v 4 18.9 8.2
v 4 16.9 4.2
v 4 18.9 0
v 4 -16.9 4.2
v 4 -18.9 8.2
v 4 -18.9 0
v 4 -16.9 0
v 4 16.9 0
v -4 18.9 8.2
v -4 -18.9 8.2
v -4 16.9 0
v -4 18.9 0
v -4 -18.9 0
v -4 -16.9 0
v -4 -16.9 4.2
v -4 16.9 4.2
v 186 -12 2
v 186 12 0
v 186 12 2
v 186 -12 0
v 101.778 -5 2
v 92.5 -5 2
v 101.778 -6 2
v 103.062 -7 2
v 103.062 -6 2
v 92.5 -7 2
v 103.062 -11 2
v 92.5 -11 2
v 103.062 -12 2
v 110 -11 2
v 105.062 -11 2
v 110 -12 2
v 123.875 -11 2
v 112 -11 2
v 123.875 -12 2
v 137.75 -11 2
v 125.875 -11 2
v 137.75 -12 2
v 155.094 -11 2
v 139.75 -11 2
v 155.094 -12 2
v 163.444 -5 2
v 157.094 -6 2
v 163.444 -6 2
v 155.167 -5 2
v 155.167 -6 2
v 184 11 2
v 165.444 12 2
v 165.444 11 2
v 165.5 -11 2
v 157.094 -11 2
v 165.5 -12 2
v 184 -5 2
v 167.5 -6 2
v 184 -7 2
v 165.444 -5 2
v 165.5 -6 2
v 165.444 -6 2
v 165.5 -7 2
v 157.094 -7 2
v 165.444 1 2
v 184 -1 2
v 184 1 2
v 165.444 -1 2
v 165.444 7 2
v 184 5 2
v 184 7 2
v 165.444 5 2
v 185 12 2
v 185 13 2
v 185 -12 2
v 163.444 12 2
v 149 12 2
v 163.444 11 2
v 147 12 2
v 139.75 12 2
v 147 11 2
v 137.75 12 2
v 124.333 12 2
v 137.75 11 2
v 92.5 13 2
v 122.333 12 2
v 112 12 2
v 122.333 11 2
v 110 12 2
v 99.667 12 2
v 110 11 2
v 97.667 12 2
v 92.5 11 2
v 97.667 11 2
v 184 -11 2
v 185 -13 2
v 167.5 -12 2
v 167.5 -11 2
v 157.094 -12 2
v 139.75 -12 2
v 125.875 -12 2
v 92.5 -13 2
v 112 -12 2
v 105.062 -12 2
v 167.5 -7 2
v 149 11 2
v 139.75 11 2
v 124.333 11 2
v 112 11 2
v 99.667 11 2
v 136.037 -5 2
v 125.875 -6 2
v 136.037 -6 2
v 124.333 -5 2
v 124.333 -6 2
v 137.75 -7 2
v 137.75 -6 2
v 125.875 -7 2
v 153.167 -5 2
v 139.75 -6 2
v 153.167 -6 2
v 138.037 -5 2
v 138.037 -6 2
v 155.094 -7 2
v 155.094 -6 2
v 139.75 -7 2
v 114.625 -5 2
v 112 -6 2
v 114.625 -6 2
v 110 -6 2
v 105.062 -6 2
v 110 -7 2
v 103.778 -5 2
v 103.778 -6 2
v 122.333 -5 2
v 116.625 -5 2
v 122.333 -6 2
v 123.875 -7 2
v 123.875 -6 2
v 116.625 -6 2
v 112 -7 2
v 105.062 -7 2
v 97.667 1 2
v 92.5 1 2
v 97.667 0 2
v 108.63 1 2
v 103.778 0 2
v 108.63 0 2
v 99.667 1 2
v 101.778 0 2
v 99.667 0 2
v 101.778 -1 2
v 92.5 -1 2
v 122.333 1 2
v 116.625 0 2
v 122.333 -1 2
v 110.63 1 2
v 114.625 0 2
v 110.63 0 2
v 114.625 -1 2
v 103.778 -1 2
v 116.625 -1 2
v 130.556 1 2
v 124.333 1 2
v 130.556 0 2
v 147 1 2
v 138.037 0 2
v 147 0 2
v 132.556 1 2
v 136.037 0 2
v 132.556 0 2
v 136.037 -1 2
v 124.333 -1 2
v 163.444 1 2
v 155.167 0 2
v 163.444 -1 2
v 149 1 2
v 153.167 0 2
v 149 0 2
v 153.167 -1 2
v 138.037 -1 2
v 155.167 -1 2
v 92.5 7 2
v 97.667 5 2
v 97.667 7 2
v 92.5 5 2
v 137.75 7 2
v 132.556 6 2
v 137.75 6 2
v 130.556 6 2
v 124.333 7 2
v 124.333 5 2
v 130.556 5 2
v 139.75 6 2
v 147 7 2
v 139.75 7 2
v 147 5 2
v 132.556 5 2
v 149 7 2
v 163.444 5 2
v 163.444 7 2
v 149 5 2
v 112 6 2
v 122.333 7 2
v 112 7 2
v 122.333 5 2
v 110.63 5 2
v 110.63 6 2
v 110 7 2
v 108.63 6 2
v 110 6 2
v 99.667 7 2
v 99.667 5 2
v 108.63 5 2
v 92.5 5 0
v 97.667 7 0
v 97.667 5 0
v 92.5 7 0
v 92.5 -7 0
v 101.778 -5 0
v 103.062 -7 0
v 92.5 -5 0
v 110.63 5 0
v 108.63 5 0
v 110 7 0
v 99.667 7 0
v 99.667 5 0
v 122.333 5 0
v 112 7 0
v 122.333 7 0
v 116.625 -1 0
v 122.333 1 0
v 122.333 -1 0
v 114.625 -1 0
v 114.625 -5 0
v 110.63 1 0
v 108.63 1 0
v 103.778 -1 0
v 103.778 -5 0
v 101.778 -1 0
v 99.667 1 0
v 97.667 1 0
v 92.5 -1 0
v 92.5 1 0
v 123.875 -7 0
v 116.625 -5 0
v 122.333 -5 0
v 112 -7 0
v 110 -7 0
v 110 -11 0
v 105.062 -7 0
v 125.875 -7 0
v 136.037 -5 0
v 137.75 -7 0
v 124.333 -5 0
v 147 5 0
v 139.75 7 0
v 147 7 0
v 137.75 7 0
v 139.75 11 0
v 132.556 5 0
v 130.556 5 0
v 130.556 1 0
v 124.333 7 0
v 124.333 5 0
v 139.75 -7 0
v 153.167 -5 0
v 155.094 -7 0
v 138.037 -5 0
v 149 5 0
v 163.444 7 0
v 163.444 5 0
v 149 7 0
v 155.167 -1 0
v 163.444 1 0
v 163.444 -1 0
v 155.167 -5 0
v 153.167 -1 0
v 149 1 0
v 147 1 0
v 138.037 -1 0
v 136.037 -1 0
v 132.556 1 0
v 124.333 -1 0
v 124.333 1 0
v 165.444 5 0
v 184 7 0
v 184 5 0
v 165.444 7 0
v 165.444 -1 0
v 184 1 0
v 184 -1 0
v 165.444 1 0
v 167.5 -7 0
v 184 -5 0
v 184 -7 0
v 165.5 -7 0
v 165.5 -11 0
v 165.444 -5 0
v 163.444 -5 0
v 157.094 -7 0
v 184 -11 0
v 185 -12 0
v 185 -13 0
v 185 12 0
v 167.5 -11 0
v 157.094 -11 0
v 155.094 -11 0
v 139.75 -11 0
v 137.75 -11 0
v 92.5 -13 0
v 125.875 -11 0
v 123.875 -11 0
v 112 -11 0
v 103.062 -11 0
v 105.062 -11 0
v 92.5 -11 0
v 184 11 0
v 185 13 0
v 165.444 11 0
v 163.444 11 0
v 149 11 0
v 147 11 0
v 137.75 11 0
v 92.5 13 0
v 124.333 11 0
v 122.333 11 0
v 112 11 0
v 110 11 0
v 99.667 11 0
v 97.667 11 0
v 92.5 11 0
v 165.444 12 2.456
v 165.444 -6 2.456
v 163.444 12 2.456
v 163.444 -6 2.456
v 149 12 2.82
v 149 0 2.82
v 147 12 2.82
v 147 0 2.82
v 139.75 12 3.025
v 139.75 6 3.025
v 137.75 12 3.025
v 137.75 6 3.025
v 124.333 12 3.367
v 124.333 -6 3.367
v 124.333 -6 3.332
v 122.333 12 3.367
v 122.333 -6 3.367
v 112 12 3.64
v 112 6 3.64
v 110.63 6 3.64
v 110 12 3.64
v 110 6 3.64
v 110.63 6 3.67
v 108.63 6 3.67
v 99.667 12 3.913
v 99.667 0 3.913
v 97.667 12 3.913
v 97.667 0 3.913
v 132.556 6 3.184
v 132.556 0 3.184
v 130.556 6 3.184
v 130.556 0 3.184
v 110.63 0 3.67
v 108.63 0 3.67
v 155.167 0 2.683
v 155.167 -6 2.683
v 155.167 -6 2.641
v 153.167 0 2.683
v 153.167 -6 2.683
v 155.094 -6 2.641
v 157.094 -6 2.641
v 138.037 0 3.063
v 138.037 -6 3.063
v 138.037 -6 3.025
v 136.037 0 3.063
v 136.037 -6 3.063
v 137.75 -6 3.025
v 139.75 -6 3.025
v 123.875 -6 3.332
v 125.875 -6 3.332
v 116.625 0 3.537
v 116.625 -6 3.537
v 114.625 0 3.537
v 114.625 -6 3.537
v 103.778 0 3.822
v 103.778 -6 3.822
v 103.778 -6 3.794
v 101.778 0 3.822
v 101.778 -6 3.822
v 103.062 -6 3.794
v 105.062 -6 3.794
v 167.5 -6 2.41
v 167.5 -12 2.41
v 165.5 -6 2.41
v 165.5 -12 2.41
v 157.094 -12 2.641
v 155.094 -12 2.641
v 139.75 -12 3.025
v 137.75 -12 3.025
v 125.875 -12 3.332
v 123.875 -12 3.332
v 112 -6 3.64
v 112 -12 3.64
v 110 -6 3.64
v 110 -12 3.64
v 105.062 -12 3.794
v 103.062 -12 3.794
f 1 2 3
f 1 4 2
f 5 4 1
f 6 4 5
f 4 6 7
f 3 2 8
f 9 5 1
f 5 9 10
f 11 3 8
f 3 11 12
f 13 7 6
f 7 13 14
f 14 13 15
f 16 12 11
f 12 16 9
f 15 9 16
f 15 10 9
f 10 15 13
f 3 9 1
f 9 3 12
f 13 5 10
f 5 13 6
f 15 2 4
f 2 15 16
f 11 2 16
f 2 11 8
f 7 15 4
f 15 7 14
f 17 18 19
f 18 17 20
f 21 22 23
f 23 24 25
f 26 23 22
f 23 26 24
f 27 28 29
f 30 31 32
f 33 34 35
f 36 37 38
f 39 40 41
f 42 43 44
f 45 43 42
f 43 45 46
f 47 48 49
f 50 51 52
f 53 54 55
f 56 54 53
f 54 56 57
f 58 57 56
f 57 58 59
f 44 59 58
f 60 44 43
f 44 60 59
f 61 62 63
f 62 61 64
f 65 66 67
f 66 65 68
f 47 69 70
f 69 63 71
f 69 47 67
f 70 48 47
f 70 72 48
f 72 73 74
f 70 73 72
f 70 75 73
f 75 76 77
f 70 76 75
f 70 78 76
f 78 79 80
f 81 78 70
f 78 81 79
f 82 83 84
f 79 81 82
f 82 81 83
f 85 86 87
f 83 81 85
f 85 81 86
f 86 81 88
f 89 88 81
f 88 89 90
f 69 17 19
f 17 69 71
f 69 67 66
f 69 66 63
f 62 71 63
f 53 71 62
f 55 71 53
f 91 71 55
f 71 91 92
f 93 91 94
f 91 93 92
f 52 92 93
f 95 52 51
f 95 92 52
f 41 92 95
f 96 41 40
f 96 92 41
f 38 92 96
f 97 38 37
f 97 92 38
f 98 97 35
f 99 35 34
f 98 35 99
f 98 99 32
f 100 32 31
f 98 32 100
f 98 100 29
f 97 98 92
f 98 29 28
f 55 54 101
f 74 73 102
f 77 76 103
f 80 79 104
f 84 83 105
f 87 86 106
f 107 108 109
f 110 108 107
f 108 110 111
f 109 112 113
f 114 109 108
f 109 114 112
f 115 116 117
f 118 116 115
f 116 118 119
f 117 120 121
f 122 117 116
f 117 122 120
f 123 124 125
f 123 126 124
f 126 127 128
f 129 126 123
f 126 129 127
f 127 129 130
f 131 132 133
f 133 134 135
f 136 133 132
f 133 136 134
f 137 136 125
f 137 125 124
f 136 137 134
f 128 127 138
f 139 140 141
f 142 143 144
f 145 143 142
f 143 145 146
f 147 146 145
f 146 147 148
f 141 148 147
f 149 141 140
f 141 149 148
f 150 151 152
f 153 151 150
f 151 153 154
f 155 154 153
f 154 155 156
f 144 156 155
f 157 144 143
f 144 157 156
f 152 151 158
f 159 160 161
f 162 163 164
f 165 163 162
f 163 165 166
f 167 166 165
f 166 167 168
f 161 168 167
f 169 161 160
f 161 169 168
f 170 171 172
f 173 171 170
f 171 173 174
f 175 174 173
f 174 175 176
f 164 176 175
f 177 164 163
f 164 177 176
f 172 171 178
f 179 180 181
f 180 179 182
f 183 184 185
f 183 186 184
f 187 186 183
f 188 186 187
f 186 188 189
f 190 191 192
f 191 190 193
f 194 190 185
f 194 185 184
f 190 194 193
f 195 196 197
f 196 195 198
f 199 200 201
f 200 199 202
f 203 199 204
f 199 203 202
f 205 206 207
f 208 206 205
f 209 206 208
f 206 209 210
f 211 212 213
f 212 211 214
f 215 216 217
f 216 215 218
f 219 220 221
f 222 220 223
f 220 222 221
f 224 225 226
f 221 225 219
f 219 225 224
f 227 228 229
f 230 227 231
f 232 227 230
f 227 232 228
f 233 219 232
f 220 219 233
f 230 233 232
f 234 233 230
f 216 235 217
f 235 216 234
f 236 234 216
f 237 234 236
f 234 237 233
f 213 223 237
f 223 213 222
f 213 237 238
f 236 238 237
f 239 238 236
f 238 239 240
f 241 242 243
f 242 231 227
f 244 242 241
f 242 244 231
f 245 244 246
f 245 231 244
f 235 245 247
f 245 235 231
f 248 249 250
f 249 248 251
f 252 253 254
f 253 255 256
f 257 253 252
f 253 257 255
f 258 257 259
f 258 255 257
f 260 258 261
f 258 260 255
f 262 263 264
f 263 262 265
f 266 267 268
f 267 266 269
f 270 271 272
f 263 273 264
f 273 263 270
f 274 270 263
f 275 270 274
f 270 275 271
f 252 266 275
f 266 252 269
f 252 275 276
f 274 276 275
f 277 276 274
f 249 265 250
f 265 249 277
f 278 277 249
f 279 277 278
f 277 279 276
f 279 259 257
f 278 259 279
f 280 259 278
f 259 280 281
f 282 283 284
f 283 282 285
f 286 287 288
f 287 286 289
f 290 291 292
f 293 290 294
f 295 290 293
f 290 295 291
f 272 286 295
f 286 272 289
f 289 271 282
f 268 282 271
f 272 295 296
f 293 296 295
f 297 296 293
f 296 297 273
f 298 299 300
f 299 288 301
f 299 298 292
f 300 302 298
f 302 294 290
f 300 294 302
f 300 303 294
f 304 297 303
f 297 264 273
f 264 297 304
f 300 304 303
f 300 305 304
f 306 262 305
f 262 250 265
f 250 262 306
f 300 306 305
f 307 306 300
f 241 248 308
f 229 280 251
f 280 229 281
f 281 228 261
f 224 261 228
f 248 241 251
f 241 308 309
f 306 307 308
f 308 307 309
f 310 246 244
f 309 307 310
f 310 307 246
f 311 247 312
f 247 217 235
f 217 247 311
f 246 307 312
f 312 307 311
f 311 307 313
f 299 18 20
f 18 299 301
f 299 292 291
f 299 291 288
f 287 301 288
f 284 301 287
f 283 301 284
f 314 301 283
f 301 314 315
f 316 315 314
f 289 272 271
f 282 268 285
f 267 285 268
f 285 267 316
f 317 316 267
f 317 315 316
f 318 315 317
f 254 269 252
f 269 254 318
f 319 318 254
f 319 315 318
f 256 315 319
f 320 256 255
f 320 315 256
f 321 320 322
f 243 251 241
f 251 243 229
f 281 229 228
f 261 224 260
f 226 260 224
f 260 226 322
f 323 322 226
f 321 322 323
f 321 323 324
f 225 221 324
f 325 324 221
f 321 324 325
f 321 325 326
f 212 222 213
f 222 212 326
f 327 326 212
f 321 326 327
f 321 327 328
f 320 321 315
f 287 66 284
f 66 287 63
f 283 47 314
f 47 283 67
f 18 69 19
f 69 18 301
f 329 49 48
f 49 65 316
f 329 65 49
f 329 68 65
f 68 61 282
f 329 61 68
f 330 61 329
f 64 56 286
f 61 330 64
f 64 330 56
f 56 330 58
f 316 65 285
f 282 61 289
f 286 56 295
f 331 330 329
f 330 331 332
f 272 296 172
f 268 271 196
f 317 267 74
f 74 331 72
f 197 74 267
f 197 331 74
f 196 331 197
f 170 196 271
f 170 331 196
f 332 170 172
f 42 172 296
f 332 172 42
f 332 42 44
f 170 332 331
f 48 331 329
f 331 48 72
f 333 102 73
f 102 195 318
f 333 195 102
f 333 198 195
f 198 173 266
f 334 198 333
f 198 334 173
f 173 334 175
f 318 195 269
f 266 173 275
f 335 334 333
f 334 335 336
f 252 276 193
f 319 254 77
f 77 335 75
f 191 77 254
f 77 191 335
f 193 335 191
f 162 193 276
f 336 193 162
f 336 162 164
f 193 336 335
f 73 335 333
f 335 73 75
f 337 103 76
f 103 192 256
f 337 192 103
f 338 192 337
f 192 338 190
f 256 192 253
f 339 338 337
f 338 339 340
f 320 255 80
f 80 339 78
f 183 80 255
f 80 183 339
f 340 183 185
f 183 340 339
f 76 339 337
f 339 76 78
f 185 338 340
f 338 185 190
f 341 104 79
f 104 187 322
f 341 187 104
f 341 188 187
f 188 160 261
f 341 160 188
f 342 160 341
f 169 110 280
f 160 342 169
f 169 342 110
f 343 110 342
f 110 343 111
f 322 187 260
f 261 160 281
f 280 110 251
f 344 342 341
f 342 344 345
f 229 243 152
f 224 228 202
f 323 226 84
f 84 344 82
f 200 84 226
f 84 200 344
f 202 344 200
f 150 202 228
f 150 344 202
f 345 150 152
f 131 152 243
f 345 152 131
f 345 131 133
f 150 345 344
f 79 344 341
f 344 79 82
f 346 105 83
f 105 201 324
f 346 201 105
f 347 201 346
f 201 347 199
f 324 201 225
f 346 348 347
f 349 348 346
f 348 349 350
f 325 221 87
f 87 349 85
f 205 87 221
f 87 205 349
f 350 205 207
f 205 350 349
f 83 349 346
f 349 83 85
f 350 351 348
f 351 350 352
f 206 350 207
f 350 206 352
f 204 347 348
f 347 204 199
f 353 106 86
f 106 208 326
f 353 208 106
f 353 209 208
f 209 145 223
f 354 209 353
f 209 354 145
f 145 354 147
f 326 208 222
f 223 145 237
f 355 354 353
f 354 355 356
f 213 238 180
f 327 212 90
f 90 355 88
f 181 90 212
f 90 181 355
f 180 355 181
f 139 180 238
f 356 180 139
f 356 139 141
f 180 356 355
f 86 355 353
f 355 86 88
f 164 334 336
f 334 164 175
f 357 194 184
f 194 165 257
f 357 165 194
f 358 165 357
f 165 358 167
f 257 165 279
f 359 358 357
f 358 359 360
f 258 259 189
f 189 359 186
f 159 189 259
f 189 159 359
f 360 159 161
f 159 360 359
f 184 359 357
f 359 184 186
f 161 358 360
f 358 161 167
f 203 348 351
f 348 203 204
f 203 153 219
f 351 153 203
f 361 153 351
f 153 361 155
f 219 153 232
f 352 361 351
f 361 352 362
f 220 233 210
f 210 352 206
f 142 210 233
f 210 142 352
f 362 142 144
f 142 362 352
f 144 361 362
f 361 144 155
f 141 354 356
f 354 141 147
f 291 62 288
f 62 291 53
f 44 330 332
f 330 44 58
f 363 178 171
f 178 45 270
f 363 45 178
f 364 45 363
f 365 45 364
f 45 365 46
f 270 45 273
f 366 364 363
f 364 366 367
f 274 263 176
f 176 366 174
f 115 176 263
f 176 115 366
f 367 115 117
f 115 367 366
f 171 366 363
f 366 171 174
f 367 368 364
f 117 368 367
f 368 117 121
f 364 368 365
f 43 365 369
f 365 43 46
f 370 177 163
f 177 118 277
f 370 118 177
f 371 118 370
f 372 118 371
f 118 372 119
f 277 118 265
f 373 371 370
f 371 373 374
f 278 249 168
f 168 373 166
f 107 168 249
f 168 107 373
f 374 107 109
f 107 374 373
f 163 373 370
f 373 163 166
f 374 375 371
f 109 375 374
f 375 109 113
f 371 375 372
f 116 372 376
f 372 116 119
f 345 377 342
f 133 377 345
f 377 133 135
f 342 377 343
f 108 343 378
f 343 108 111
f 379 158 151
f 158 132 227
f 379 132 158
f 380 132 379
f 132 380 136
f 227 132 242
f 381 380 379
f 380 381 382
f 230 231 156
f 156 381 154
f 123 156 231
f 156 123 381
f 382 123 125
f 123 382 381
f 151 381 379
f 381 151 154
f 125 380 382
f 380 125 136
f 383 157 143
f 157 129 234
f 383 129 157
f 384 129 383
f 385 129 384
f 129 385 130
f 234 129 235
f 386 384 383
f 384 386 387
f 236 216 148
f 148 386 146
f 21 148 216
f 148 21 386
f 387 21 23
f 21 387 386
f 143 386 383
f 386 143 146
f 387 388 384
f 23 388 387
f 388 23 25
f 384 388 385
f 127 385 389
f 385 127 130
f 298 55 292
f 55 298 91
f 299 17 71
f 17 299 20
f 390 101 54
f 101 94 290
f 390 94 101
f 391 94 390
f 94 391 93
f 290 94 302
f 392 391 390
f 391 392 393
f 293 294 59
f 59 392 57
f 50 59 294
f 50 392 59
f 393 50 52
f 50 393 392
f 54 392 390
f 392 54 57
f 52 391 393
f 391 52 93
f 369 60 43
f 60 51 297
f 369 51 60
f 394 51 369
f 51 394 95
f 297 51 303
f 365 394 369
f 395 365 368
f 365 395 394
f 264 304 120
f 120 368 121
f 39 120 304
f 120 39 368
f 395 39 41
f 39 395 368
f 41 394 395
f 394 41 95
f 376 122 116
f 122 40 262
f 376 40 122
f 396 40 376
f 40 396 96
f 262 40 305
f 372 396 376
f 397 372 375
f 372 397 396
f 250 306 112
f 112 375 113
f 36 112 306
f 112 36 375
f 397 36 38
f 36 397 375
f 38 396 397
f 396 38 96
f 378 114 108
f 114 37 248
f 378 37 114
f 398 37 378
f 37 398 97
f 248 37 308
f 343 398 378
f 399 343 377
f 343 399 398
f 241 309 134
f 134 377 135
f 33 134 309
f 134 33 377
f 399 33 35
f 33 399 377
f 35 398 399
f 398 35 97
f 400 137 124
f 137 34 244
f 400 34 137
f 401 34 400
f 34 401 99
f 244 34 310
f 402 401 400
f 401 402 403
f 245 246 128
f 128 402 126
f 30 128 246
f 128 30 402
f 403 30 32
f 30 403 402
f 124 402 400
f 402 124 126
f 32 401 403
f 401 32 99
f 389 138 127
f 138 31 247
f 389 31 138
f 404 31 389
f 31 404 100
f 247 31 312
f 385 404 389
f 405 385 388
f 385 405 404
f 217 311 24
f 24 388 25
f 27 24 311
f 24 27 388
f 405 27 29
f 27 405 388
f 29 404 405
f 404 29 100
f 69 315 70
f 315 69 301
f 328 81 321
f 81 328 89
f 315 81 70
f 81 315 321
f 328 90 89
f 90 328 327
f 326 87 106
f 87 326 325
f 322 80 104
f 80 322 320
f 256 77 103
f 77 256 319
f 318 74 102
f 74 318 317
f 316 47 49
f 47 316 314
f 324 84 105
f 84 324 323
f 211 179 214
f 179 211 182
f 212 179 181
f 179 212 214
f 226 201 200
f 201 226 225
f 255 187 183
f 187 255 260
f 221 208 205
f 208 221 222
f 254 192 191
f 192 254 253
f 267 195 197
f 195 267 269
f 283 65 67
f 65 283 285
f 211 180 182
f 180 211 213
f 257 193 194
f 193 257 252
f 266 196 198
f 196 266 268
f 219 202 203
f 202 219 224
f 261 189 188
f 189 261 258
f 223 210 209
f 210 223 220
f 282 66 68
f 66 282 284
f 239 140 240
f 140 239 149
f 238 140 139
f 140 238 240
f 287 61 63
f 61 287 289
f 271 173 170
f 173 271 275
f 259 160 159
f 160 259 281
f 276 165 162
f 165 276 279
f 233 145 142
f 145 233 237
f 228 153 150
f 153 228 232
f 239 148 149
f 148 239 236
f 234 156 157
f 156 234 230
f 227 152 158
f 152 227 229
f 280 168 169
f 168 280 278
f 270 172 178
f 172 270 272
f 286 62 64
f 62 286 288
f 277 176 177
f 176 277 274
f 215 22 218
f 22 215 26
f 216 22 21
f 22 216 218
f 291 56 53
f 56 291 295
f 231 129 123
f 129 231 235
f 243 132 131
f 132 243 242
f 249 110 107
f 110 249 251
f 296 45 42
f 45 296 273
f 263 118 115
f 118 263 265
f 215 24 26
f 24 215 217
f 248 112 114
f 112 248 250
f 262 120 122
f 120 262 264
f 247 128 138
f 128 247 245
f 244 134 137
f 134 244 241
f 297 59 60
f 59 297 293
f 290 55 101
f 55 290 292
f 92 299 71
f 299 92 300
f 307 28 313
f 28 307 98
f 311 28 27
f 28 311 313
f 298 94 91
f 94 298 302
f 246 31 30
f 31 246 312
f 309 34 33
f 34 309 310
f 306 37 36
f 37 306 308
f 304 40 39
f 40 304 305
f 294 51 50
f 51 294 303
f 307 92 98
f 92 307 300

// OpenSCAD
// Generated by SolidPython 1.1.3 on 2022-07-08 14:14:54


union() {
	difference() {
		translate(v = [0, 0, 4.1000000000]) {
			cube(center = true, size = [8, 37.8000000000, 8.2000000000]);
		}
		translate(v = [0, 0, 2.1000000000]) {
			cube(center = true, size = [12, 33.8000000000, 4.2000000000]);
		}
	}
	translate(v = [185.0, 9.0000000000, 1.0]) {
		cube(center = true, size = [2, 6.0000000000, 2.0]);
	}
	translate(v = [164.44444444444443, 9.0000000000, 1.2277777777777779]) {
		cube(center = true, size = [2, 6.0000000000, 2.4555555555555557]);
	}
	translate(v = [148.0, 9.0000000000, 1.41]) {
		cube(center = true, size = [2, 6.0000000000, 2.82]);
	}
	translate(v = [138.75, 9.0000000000, 1.5125]) {
		cube(center = true, size = [2, 6.0000000000, 3.025]);
	}
	translate(v = [123.33333333333333, 9.0000000000, 1.6833333333333333]) {
		cube(center = true, size = [2, 6.0000000000, 3.3666666666666667]);
	}
	translate(v = [111.0, 9.0000000000, 1.8199999999999998]) {
		cube(center = true, size = [2, 6.0000000000, 3.6399999999999997]);
	}
	translate(v = [98.66666666666667, 9.0000000000, 1.9566666666666666]) {
		cube(center = true, size = [2, 6.0000000000, 3.913333333333333]);
	}
	translate(v = [185.0, 3.0000000000, 1.0]) {
		cube(center = true, size = [2, 6.0000000000, 2.0]);
	}
	translate(v = [164.44444444444443, 3.0000000000, 1.2277777777777779]) {
		cube(center = true, size = [2, 6.0000000000, 2.4555555555555557]);
	}
	translate(v = [148.0, 3.0000000000, 1.41]) {
		cube(center = true, size = [2, 6.0000000000, 2.82]);
	}
	translate(v = [131.55555555555554, 3.0000000000, 1.5922222222222224]) {
		cube(center = true, size = [2, 6.0000000000, 3.184444444444445]);
	}
	translate(v = [123.33333333333333, 3.0000000000, 1.6833333333333333]) {
		cube(center = true, size = [2, 6.0000000000, 3.3666666666666667]);
	}
	translate(v = [109.62962962962962, 3.0000000000, 1.835185185185185]) {
		cube(center = true, size = [2, 6.0000000000, 3.67037037037037]);
	}
	translate(v = [98.66666666666667, 3.0000000000, 1.9566666666666666]) {
		cube(center = true, size = [2, 6.0000000000, 3.913333333333333]);
	}
	translate(v = [185.0, -3.0000000000, 1.0]) {
		cube(center = true, size = [2, 6.0000000000, 2.0]);
	}
	translate(v = [164.44444444444446, -3.0000000000, 1.2277777777777776]) {
		cube(center = true, size = [2, 6.0000000000, 2.4555555555555553]);
	}
	translate(v = [154.16666666666669, -3.0000000000, 1.3416666666666663]) {
		cube(center = true, size = [2, 6.0000000000, 2.6833333333333327]);
	}
	translate(v = [137.03703703703704, -3.0000000000, 1.5314814814814814]) {
		cube(center = true, size = [2, 6.0000000000, 3.062962962962963]);
	}
	translate(v = [123.33333333333334, -3.0000000000, 1.6833333333333331]) {
		cube(center = true, size = [2, 6.0000000000, 3.3666666666666663]);
	}
	translate(v = [115.625, -3.0000000000, 1.7687499999999998]) {
		cube(center = true, size = [2, 6.0000000000, 3.5374999999999996]);
	}
	translate(v = [102.77777777777779, -3.0000000000, 1.911111111111111]) {
		cube(center = true, size = [2, 6.0000000000, 3.822222222222222]);
	}
	translate(v = [185.0, -9.0000000000, 1.0]) {
		cube(center = true, size = [2, 6.0000000000, 2.0]);
	}
	translate(v = [166.5, -9.0000000000, 1.205]) {
		cube(center = true, size = [2, 6.0000000000, 2.41]);
	}
	translate(v = [156.09375, -9.0000000000, 1.3203125]) {
		cube(center = true, size = [2, 6.0000000000, 2.640625]);
	}
	translate(v = [138.75, -9.0000000000, 1.5125]) {
		cube(center = true, size = [2, 6.0000000000, 3.025]);
	}
	translate(v = [124.87499999999999, -9.0000000000, 1.6662500000000002]) {
		cube(center = true, size = [2, 6.0000000000, 3.3325000000000005]);
	}
	translate(v = [111.0, -9.0000000000, 1.8199999999999998]) {
		cube(center = true, size = [2, 6.0000000000, 3.6399999999999997]);
	}
	translate(v = [104.0625, -9.0000000000, 1.8968749999999999]) {
		cube(center = true, size = [2, 6.0000000000, 3.7937499999999997]);
	}
	translate(v = [138.7500000000, 12.0000000000, 1.0000000000]) {
		cube(center = true, size = [92.5000000000, 2, 2]);
	}
	translate(v = [138.7500000000, 6.0000000000, 1.0000000000]) {
		cube(center = true, size = [92.5000000000, 2, 2]);
	}
	translate(v = [138.7500000000, 0.0000000000, 1.0000000000]) {
		cube(center = true, size = [92.5000000000, 2, 2]);
	}
	translate(v = [138.7500000000, -6.0000000000, 1.0000000000]) {
		cube(center = true, size = [92.5000000000, 2, 2]);
	}
	translate(v = [138.7500000000, -12.0000000000, 1.0000000000]) {
		cube(center = true, size = [92.5000000000, 2, 2]);
	}
}
